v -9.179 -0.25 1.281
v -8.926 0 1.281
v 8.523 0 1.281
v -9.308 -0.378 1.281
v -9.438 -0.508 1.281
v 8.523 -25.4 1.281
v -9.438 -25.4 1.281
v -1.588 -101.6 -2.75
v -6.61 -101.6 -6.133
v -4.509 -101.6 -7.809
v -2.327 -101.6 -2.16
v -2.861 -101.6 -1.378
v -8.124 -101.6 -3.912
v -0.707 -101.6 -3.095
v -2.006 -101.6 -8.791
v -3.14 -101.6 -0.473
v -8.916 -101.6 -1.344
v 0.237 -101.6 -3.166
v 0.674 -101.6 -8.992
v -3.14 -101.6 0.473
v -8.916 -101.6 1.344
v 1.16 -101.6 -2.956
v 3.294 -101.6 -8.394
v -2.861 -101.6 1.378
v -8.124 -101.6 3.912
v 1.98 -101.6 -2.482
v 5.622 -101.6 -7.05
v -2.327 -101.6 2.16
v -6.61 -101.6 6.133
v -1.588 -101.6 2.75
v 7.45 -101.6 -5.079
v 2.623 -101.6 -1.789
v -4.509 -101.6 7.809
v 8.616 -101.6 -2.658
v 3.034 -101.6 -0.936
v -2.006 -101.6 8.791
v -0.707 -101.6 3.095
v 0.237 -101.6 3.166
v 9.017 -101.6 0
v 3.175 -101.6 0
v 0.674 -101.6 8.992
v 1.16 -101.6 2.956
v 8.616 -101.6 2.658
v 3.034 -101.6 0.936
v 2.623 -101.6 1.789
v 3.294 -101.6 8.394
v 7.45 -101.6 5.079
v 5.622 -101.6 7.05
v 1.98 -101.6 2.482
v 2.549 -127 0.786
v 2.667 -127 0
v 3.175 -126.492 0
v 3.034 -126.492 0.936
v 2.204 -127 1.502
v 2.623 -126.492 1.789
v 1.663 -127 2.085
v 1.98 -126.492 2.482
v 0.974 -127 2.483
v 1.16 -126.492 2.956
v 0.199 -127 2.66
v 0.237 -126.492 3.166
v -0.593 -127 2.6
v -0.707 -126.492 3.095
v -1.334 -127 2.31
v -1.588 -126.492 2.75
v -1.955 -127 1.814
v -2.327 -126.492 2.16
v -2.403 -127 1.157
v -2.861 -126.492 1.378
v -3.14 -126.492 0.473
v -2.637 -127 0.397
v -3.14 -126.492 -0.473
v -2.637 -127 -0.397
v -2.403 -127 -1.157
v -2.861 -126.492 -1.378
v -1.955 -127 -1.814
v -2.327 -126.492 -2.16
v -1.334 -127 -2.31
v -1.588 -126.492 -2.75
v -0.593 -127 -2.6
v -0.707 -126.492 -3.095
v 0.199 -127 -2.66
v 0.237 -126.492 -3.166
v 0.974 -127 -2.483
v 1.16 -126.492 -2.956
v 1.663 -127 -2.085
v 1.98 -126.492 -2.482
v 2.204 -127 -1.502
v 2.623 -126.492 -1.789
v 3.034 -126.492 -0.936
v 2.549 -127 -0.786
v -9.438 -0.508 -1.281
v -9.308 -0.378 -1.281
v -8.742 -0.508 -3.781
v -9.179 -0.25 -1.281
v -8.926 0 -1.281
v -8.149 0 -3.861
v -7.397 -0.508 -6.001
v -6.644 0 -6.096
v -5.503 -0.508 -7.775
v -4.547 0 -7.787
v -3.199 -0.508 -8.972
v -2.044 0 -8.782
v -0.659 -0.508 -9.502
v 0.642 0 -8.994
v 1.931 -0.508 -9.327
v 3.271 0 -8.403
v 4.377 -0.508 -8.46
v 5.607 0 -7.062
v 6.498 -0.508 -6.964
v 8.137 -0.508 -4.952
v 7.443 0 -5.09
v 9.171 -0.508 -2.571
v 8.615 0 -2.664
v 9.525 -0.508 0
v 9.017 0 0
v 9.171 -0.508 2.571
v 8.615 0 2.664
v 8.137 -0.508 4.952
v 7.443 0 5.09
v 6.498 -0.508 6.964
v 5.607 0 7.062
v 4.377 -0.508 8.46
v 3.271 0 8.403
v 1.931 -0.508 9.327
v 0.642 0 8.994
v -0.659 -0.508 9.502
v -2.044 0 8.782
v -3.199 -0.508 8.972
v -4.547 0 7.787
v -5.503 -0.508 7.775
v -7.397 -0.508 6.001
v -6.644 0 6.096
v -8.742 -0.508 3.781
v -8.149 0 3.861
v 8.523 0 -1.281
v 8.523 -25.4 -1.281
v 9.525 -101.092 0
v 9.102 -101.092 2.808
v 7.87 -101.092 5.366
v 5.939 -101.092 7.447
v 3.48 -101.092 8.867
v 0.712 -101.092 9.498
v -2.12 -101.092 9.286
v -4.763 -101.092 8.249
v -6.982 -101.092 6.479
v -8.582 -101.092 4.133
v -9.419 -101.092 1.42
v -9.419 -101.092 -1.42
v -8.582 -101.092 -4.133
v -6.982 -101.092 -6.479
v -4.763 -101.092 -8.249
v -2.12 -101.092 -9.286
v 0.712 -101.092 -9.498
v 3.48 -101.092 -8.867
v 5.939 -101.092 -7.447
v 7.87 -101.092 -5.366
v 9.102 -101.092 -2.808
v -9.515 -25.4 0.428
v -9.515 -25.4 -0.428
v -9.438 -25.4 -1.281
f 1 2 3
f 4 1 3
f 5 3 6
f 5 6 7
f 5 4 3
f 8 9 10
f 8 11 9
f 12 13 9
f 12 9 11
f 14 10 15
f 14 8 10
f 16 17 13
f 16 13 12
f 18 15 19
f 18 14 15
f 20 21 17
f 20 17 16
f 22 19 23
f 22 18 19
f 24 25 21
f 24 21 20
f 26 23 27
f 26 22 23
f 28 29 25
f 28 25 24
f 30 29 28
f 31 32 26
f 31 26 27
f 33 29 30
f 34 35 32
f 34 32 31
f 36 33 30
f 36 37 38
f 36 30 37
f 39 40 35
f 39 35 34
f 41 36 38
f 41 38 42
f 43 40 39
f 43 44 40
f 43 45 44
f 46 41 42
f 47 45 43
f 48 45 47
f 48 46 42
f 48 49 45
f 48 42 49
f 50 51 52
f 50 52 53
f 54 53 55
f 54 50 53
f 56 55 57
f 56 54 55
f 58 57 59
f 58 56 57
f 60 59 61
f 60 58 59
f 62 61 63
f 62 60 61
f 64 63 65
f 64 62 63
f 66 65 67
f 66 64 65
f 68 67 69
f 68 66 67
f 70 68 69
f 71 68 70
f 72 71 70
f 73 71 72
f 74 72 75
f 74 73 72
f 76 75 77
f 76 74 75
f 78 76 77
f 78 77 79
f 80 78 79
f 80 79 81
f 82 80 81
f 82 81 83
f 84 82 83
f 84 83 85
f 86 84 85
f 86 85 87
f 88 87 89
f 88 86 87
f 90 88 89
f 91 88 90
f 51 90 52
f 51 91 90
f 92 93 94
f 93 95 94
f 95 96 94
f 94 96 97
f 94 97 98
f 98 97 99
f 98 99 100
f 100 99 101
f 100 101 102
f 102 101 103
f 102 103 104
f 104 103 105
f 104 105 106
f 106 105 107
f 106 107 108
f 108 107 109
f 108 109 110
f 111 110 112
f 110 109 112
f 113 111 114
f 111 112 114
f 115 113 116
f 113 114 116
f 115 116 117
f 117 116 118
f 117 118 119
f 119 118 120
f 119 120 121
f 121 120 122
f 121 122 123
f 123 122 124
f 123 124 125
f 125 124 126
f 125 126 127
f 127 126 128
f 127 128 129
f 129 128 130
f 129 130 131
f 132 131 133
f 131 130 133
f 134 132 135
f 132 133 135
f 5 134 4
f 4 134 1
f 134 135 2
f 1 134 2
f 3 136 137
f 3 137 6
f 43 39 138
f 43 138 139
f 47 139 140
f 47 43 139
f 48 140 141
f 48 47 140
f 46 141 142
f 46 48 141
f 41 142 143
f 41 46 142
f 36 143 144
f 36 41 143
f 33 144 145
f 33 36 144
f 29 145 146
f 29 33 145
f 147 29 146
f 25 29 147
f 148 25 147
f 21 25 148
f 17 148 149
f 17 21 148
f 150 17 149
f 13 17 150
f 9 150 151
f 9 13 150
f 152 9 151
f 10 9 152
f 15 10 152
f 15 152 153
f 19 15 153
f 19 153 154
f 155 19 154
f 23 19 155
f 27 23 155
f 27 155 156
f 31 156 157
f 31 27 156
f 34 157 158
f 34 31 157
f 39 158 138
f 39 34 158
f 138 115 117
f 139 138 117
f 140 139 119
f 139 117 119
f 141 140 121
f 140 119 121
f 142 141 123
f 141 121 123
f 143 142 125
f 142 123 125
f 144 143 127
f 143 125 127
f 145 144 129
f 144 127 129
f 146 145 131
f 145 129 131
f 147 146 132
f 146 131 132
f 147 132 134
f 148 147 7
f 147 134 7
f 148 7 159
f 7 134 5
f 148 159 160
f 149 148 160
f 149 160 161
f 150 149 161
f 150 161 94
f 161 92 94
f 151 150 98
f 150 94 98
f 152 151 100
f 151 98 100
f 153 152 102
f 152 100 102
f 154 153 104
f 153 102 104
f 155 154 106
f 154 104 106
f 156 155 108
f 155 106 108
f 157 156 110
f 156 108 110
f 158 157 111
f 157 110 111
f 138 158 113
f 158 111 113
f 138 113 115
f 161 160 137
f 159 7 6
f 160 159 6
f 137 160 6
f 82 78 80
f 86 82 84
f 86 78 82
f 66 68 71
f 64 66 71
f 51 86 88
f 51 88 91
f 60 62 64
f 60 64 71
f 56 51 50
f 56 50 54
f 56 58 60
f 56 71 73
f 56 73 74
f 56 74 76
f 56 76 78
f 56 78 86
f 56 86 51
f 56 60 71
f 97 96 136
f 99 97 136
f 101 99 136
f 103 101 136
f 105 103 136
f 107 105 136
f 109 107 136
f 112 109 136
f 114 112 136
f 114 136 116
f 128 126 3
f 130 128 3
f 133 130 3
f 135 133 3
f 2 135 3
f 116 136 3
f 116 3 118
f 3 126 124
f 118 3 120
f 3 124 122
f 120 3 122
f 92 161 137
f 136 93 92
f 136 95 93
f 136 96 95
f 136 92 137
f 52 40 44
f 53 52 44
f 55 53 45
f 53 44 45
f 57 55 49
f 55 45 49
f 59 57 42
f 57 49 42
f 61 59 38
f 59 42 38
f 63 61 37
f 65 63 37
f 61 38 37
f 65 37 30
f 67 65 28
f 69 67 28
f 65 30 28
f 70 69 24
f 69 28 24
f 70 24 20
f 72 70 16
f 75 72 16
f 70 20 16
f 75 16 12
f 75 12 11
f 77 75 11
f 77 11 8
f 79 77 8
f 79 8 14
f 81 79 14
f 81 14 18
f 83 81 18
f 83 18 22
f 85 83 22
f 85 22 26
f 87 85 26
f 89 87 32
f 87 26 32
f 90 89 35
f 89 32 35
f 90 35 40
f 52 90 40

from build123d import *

# Parameters (mm, degrees)
F0_R     = 9.525
F1_DEPTH = 101.6
F2_W     = 9.525
F2_H     = 2.5618169457
F2_W_2   = 8.5228569806
F3_DEPTH = 25.4
F4_R     = 3.175
F5_DEPTH = 25.4
F6_SIZE  = 0.508


with BuildPart() as f1:
    # F0 (on Front) → F1 (new body)
    with BuildSketch(Plane.XZ):
        Circle(F0_R)
    extrude(amount=F1_DEPTH)

    # F2 (on Front) → F3 (cut)
    with BuildSketch(Plane.XZ):
        with Locations((-4.7625, 0)):
            Rectangle(F2_W, F2_H)
        with Locations((4.2614284903, 0)):
            Rectangle(F2_W_2, F2_H)
    extrude(amount=F3_DEPTH, mode=Mode.SUBTRACT)

    # F4 (on face) → F5 (join)
    with BuildSketch(Plane.XZ.offset(101.6)):
        Circle(F4_R)
    extrude(amount=F5_DEPTH)

    # F6
    f6_edges = [f1.edges().sort_by_distance(p)[0] for p in [
        (-3.175, -127, 0),
        (-9.525, -101.6, 0),
        (0.641914, 0, 9.503345),
        (0.641914, 0, -9.503345),
    ]]
    chamfer(f6_edges, length=F6_SIZE)


solid = f1.part
